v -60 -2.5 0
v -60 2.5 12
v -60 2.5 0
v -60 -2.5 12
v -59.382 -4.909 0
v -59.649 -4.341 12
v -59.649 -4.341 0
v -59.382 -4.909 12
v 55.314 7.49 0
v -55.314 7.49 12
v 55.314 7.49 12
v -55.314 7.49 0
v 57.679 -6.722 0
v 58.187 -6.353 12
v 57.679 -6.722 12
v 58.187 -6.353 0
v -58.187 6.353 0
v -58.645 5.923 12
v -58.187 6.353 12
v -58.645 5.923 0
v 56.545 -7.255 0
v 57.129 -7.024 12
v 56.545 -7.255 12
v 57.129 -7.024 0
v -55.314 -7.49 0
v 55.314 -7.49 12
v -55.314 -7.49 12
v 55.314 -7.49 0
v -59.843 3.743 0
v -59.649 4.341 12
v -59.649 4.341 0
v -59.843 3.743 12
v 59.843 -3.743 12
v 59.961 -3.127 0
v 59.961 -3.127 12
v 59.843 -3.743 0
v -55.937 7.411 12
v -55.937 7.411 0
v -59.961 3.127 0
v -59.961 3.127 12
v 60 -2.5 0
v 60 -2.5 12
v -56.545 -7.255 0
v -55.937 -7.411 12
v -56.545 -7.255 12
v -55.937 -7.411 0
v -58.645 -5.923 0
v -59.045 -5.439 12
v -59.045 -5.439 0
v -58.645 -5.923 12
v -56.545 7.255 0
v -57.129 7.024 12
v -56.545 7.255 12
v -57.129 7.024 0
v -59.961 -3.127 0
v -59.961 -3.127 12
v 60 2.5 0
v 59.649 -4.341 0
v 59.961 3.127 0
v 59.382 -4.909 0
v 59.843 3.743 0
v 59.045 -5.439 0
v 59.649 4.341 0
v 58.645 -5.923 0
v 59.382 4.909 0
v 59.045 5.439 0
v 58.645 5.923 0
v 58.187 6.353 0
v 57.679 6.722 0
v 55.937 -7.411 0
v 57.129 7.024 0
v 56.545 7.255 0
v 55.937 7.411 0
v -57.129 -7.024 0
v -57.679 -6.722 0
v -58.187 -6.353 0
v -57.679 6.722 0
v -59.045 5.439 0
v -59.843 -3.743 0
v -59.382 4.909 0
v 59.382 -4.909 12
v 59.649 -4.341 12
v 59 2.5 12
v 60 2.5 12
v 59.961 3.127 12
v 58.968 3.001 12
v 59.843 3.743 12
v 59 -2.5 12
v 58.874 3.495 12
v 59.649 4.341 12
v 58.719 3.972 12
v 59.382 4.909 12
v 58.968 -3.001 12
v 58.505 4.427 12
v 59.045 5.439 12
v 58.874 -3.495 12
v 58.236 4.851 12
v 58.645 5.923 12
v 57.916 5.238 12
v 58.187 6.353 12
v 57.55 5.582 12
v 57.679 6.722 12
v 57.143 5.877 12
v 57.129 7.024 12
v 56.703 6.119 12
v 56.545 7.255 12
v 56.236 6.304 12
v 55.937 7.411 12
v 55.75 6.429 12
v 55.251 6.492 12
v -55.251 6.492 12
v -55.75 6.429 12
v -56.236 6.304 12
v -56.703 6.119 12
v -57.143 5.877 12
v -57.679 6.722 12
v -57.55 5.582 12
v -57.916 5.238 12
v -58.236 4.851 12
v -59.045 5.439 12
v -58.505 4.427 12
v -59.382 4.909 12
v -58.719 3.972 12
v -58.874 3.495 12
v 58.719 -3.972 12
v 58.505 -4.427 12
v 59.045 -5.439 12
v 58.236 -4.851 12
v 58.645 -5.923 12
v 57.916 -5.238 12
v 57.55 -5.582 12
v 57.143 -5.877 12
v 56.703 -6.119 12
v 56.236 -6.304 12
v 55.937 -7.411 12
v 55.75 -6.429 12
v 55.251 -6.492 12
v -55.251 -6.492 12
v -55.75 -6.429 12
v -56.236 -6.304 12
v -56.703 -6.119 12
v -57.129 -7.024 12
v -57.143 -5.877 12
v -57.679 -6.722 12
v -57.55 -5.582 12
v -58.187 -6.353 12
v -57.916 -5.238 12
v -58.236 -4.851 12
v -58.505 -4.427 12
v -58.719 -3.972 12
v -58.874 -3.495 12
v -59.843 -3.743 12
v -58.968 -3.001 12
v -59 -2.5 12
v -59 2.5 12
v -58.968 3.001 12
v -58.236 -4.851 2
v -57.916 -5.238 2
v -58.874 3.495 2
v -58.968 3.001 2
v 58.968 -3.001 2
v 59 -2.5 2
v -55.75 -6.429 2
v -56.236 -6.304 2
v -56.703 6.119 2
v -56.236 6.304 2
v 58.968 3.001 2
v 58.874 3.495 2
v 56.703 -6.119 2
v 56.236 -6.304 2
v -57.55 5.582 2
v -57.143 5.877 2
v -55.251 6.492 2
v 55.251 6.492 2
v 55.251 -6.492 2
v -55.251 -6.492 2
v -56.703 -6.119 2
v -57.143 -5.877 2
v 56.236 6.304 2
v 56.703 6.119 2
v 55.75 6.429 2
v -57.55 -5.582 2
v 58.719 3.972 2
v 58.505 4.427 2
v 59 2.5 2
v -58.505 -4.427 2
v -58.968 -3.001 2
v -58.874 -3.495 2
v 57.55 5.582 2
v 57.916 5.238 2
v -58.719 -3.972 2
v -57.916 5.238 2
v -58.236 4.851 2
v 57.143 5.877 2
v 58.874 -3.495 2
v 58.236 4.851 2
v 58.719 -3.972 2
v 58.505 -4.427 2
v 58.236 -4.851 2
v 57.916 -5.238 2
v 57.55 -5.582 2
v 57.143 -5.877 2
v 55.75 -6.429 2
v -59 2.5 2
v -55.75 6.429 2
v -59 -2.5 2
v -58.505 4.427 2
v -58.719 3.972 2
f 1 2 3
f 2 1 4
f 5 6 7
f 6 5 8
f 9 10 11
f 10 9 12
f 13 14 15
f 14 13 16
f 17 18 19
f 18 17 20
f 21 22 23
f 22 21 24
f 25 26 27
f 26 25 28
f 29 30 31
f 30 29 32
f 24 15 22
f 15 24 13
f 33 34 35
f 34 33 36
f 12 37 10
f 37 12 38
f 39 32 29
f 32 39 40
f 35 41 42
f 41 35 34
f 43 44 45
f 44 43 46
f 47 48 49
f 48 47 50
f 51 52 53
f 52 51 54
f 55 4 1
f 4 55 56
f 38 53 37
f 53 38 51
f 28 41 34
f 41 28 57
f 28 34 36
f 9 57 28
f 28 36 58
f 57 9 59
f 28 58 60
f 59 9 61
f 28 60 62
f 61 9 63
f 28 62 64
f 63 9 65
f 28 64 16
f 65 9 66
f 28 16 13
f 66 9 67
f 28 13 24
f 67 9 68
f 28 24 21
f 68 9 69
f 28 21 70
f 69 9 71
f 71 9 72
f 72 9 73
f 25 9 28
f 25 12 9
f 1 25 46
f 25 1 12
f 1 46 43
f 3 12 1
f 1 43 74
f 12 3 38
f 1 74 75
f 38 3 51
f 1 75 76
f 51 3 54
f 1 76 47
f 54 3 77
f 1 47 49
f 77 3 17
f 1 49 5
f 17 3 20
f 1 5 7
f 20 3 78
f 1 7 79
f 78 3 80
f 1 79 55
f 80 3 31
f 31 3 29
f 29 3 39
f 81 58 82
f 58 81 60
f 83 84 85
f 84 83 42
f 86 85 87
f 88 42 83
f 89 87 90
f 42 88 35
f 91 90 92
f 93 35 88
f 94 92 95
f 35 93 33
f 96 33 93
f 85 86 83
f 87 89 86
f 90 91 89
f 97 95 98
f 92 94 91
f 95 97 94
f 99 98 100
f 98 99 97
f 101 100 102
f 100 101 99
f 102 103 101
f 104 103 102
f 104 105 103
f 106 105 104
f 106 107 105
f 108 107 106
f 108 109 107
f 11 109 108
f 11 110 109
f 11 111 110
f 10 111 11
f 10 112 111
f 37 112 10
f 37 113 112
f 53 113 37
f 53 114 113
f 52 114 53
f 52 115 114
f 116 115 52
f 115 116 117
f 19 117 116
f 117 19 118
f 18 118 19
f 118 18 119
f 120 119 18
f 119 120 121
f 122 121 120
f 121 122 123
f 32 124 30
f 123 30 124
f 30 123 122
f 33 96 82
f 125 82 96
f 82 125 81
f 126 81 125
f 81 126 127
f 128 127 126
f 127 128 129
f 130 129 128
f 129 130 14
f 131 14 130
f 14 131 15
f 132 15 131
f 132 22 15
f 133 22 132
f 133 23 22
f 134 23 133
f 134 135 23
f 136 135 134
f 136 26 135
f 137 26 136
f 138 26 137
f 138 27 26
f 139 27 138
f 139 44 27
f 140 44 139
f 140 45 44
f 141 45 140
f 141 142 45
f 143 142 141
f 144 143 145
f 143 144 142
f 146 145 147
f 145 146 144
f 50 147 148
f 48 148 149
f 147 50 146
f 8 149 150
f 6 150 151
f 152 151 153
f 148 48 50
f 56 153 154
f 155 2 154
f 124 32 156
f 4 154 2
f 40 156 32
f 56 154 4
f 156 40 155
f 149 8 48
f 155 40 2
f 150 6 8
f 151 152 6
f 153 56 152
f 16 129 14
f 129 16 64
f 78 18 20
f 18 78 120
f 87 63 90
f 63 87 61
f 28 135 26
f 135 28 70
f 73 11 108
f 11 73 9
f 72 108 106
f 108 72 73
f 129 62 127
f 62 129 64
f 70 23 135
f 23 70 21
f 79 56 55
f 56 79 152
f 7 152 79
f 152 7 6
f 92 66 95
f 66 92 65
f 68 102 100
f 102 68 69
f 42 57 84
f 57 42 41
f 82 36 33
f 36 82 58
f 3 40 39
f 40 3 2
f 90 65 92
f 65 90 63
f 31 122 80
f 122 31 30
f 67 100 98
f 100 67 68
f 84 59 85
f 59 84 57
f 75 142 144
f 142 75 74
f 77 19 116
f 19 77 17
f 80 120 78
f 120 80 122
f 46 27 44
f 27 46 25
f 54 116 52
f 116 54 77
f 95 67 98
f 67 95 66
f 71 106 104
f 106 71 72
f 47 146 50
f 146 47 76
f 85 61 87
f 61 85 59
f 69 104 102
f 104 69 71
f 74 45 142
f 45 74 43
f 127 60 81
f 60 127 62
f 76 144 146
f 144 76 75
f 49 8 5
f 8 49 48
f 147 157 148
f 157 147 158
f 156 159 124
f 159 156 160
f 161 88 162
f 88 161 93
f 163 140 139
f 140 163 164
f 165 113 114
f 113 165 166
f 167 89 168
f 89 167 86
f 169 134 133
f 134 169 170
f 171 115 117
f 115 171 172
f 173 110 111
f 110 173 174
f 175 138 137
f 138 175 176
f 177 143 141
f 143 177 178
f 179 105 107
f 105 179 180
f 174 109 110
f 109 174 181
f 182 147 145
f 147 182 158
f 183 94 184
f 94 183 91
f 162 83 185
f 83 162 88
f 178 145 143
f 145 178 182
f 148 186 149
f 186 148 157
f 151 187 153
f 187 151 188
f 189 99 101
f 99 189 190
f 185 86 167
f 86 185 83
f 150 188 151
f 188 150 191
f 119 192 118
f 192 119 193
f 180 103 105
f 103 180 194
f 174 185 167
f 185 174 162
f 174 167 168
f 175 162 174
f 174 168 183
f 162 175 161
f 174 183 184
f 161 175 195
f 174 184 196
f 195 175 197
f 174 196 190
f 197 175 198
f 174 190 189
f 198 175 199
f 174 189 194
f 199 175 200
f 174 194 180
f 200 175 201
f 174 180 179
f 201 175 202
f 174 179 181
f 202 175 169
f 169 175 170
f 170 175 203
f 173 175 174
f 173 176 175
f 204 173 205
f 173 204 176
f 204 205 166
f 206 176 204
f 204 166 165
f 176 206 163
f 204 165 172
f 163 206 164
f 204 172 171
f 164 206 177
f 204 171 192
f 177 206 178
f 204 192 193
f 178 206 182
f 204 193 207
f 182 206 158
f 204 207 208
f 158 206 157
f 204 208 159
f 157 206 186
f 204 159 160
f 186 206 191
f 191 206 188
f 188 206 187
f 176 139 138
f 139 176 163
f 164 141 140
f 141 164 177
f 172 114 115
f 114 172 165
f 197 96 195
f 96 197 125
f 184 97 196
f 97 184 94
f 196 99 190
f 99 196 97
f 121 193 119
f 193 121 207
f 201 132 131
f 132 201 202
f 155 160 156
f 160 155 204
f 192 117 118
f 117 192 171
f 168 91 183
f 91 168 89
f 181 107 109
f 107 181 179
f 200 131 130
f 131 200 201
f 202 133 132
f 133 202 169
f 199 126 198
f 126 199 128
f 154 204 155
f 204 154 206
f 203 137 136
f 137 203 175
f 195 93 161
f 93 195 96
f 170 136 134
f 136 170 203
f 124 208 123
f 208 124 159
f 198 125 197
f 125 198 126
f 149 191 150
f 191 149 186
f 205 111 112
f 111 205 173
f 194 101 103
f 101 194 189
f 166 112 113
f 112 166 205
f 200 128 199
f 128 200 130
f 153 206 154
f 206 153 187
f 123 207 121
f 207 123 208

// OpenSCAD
$fn = 50;


difference() {
	union() {
		hull() {
			translate(v = [-55.0000000000, 2.5000000000, 0]) {
				cylinder(h = 12, r = 5);
			}
			translate(v = [55.0000000000, 2.5000000000, 0]) {
				cylinder(h = 12, r = 5);
			}
			translate(v = [-55.0000000000, -2.5000000000, 0]) {
				cylinder(h = 12, r = 5);
			}
			translate(v = [55.0000000000, -2.5000000000, 0]) {
				cylinder(h = 12, r = 5);
			}
		}
	}
	union() {
		translate(v = [0, 0, 2]) {
			hull() {
				translate(v = [-55.0000000000, 2.5000000000, 0]) {
					cylinder(h = 10, r = 4);
				}
				translate(v = [55.0000000000, 2.5000000000, 0]) {
					cylinder(h = 10, r = 4);
				}
				translate(v = [-55.0000000000, -2.5000000000, 0]) {
					cylinder(h = 10, r = 4);
				}
				translate(v = [55.0000000000, -2.5000000000, 0]) {
					cylinder(h = 10, r = 4);
				}
			}
		}
	}
}
